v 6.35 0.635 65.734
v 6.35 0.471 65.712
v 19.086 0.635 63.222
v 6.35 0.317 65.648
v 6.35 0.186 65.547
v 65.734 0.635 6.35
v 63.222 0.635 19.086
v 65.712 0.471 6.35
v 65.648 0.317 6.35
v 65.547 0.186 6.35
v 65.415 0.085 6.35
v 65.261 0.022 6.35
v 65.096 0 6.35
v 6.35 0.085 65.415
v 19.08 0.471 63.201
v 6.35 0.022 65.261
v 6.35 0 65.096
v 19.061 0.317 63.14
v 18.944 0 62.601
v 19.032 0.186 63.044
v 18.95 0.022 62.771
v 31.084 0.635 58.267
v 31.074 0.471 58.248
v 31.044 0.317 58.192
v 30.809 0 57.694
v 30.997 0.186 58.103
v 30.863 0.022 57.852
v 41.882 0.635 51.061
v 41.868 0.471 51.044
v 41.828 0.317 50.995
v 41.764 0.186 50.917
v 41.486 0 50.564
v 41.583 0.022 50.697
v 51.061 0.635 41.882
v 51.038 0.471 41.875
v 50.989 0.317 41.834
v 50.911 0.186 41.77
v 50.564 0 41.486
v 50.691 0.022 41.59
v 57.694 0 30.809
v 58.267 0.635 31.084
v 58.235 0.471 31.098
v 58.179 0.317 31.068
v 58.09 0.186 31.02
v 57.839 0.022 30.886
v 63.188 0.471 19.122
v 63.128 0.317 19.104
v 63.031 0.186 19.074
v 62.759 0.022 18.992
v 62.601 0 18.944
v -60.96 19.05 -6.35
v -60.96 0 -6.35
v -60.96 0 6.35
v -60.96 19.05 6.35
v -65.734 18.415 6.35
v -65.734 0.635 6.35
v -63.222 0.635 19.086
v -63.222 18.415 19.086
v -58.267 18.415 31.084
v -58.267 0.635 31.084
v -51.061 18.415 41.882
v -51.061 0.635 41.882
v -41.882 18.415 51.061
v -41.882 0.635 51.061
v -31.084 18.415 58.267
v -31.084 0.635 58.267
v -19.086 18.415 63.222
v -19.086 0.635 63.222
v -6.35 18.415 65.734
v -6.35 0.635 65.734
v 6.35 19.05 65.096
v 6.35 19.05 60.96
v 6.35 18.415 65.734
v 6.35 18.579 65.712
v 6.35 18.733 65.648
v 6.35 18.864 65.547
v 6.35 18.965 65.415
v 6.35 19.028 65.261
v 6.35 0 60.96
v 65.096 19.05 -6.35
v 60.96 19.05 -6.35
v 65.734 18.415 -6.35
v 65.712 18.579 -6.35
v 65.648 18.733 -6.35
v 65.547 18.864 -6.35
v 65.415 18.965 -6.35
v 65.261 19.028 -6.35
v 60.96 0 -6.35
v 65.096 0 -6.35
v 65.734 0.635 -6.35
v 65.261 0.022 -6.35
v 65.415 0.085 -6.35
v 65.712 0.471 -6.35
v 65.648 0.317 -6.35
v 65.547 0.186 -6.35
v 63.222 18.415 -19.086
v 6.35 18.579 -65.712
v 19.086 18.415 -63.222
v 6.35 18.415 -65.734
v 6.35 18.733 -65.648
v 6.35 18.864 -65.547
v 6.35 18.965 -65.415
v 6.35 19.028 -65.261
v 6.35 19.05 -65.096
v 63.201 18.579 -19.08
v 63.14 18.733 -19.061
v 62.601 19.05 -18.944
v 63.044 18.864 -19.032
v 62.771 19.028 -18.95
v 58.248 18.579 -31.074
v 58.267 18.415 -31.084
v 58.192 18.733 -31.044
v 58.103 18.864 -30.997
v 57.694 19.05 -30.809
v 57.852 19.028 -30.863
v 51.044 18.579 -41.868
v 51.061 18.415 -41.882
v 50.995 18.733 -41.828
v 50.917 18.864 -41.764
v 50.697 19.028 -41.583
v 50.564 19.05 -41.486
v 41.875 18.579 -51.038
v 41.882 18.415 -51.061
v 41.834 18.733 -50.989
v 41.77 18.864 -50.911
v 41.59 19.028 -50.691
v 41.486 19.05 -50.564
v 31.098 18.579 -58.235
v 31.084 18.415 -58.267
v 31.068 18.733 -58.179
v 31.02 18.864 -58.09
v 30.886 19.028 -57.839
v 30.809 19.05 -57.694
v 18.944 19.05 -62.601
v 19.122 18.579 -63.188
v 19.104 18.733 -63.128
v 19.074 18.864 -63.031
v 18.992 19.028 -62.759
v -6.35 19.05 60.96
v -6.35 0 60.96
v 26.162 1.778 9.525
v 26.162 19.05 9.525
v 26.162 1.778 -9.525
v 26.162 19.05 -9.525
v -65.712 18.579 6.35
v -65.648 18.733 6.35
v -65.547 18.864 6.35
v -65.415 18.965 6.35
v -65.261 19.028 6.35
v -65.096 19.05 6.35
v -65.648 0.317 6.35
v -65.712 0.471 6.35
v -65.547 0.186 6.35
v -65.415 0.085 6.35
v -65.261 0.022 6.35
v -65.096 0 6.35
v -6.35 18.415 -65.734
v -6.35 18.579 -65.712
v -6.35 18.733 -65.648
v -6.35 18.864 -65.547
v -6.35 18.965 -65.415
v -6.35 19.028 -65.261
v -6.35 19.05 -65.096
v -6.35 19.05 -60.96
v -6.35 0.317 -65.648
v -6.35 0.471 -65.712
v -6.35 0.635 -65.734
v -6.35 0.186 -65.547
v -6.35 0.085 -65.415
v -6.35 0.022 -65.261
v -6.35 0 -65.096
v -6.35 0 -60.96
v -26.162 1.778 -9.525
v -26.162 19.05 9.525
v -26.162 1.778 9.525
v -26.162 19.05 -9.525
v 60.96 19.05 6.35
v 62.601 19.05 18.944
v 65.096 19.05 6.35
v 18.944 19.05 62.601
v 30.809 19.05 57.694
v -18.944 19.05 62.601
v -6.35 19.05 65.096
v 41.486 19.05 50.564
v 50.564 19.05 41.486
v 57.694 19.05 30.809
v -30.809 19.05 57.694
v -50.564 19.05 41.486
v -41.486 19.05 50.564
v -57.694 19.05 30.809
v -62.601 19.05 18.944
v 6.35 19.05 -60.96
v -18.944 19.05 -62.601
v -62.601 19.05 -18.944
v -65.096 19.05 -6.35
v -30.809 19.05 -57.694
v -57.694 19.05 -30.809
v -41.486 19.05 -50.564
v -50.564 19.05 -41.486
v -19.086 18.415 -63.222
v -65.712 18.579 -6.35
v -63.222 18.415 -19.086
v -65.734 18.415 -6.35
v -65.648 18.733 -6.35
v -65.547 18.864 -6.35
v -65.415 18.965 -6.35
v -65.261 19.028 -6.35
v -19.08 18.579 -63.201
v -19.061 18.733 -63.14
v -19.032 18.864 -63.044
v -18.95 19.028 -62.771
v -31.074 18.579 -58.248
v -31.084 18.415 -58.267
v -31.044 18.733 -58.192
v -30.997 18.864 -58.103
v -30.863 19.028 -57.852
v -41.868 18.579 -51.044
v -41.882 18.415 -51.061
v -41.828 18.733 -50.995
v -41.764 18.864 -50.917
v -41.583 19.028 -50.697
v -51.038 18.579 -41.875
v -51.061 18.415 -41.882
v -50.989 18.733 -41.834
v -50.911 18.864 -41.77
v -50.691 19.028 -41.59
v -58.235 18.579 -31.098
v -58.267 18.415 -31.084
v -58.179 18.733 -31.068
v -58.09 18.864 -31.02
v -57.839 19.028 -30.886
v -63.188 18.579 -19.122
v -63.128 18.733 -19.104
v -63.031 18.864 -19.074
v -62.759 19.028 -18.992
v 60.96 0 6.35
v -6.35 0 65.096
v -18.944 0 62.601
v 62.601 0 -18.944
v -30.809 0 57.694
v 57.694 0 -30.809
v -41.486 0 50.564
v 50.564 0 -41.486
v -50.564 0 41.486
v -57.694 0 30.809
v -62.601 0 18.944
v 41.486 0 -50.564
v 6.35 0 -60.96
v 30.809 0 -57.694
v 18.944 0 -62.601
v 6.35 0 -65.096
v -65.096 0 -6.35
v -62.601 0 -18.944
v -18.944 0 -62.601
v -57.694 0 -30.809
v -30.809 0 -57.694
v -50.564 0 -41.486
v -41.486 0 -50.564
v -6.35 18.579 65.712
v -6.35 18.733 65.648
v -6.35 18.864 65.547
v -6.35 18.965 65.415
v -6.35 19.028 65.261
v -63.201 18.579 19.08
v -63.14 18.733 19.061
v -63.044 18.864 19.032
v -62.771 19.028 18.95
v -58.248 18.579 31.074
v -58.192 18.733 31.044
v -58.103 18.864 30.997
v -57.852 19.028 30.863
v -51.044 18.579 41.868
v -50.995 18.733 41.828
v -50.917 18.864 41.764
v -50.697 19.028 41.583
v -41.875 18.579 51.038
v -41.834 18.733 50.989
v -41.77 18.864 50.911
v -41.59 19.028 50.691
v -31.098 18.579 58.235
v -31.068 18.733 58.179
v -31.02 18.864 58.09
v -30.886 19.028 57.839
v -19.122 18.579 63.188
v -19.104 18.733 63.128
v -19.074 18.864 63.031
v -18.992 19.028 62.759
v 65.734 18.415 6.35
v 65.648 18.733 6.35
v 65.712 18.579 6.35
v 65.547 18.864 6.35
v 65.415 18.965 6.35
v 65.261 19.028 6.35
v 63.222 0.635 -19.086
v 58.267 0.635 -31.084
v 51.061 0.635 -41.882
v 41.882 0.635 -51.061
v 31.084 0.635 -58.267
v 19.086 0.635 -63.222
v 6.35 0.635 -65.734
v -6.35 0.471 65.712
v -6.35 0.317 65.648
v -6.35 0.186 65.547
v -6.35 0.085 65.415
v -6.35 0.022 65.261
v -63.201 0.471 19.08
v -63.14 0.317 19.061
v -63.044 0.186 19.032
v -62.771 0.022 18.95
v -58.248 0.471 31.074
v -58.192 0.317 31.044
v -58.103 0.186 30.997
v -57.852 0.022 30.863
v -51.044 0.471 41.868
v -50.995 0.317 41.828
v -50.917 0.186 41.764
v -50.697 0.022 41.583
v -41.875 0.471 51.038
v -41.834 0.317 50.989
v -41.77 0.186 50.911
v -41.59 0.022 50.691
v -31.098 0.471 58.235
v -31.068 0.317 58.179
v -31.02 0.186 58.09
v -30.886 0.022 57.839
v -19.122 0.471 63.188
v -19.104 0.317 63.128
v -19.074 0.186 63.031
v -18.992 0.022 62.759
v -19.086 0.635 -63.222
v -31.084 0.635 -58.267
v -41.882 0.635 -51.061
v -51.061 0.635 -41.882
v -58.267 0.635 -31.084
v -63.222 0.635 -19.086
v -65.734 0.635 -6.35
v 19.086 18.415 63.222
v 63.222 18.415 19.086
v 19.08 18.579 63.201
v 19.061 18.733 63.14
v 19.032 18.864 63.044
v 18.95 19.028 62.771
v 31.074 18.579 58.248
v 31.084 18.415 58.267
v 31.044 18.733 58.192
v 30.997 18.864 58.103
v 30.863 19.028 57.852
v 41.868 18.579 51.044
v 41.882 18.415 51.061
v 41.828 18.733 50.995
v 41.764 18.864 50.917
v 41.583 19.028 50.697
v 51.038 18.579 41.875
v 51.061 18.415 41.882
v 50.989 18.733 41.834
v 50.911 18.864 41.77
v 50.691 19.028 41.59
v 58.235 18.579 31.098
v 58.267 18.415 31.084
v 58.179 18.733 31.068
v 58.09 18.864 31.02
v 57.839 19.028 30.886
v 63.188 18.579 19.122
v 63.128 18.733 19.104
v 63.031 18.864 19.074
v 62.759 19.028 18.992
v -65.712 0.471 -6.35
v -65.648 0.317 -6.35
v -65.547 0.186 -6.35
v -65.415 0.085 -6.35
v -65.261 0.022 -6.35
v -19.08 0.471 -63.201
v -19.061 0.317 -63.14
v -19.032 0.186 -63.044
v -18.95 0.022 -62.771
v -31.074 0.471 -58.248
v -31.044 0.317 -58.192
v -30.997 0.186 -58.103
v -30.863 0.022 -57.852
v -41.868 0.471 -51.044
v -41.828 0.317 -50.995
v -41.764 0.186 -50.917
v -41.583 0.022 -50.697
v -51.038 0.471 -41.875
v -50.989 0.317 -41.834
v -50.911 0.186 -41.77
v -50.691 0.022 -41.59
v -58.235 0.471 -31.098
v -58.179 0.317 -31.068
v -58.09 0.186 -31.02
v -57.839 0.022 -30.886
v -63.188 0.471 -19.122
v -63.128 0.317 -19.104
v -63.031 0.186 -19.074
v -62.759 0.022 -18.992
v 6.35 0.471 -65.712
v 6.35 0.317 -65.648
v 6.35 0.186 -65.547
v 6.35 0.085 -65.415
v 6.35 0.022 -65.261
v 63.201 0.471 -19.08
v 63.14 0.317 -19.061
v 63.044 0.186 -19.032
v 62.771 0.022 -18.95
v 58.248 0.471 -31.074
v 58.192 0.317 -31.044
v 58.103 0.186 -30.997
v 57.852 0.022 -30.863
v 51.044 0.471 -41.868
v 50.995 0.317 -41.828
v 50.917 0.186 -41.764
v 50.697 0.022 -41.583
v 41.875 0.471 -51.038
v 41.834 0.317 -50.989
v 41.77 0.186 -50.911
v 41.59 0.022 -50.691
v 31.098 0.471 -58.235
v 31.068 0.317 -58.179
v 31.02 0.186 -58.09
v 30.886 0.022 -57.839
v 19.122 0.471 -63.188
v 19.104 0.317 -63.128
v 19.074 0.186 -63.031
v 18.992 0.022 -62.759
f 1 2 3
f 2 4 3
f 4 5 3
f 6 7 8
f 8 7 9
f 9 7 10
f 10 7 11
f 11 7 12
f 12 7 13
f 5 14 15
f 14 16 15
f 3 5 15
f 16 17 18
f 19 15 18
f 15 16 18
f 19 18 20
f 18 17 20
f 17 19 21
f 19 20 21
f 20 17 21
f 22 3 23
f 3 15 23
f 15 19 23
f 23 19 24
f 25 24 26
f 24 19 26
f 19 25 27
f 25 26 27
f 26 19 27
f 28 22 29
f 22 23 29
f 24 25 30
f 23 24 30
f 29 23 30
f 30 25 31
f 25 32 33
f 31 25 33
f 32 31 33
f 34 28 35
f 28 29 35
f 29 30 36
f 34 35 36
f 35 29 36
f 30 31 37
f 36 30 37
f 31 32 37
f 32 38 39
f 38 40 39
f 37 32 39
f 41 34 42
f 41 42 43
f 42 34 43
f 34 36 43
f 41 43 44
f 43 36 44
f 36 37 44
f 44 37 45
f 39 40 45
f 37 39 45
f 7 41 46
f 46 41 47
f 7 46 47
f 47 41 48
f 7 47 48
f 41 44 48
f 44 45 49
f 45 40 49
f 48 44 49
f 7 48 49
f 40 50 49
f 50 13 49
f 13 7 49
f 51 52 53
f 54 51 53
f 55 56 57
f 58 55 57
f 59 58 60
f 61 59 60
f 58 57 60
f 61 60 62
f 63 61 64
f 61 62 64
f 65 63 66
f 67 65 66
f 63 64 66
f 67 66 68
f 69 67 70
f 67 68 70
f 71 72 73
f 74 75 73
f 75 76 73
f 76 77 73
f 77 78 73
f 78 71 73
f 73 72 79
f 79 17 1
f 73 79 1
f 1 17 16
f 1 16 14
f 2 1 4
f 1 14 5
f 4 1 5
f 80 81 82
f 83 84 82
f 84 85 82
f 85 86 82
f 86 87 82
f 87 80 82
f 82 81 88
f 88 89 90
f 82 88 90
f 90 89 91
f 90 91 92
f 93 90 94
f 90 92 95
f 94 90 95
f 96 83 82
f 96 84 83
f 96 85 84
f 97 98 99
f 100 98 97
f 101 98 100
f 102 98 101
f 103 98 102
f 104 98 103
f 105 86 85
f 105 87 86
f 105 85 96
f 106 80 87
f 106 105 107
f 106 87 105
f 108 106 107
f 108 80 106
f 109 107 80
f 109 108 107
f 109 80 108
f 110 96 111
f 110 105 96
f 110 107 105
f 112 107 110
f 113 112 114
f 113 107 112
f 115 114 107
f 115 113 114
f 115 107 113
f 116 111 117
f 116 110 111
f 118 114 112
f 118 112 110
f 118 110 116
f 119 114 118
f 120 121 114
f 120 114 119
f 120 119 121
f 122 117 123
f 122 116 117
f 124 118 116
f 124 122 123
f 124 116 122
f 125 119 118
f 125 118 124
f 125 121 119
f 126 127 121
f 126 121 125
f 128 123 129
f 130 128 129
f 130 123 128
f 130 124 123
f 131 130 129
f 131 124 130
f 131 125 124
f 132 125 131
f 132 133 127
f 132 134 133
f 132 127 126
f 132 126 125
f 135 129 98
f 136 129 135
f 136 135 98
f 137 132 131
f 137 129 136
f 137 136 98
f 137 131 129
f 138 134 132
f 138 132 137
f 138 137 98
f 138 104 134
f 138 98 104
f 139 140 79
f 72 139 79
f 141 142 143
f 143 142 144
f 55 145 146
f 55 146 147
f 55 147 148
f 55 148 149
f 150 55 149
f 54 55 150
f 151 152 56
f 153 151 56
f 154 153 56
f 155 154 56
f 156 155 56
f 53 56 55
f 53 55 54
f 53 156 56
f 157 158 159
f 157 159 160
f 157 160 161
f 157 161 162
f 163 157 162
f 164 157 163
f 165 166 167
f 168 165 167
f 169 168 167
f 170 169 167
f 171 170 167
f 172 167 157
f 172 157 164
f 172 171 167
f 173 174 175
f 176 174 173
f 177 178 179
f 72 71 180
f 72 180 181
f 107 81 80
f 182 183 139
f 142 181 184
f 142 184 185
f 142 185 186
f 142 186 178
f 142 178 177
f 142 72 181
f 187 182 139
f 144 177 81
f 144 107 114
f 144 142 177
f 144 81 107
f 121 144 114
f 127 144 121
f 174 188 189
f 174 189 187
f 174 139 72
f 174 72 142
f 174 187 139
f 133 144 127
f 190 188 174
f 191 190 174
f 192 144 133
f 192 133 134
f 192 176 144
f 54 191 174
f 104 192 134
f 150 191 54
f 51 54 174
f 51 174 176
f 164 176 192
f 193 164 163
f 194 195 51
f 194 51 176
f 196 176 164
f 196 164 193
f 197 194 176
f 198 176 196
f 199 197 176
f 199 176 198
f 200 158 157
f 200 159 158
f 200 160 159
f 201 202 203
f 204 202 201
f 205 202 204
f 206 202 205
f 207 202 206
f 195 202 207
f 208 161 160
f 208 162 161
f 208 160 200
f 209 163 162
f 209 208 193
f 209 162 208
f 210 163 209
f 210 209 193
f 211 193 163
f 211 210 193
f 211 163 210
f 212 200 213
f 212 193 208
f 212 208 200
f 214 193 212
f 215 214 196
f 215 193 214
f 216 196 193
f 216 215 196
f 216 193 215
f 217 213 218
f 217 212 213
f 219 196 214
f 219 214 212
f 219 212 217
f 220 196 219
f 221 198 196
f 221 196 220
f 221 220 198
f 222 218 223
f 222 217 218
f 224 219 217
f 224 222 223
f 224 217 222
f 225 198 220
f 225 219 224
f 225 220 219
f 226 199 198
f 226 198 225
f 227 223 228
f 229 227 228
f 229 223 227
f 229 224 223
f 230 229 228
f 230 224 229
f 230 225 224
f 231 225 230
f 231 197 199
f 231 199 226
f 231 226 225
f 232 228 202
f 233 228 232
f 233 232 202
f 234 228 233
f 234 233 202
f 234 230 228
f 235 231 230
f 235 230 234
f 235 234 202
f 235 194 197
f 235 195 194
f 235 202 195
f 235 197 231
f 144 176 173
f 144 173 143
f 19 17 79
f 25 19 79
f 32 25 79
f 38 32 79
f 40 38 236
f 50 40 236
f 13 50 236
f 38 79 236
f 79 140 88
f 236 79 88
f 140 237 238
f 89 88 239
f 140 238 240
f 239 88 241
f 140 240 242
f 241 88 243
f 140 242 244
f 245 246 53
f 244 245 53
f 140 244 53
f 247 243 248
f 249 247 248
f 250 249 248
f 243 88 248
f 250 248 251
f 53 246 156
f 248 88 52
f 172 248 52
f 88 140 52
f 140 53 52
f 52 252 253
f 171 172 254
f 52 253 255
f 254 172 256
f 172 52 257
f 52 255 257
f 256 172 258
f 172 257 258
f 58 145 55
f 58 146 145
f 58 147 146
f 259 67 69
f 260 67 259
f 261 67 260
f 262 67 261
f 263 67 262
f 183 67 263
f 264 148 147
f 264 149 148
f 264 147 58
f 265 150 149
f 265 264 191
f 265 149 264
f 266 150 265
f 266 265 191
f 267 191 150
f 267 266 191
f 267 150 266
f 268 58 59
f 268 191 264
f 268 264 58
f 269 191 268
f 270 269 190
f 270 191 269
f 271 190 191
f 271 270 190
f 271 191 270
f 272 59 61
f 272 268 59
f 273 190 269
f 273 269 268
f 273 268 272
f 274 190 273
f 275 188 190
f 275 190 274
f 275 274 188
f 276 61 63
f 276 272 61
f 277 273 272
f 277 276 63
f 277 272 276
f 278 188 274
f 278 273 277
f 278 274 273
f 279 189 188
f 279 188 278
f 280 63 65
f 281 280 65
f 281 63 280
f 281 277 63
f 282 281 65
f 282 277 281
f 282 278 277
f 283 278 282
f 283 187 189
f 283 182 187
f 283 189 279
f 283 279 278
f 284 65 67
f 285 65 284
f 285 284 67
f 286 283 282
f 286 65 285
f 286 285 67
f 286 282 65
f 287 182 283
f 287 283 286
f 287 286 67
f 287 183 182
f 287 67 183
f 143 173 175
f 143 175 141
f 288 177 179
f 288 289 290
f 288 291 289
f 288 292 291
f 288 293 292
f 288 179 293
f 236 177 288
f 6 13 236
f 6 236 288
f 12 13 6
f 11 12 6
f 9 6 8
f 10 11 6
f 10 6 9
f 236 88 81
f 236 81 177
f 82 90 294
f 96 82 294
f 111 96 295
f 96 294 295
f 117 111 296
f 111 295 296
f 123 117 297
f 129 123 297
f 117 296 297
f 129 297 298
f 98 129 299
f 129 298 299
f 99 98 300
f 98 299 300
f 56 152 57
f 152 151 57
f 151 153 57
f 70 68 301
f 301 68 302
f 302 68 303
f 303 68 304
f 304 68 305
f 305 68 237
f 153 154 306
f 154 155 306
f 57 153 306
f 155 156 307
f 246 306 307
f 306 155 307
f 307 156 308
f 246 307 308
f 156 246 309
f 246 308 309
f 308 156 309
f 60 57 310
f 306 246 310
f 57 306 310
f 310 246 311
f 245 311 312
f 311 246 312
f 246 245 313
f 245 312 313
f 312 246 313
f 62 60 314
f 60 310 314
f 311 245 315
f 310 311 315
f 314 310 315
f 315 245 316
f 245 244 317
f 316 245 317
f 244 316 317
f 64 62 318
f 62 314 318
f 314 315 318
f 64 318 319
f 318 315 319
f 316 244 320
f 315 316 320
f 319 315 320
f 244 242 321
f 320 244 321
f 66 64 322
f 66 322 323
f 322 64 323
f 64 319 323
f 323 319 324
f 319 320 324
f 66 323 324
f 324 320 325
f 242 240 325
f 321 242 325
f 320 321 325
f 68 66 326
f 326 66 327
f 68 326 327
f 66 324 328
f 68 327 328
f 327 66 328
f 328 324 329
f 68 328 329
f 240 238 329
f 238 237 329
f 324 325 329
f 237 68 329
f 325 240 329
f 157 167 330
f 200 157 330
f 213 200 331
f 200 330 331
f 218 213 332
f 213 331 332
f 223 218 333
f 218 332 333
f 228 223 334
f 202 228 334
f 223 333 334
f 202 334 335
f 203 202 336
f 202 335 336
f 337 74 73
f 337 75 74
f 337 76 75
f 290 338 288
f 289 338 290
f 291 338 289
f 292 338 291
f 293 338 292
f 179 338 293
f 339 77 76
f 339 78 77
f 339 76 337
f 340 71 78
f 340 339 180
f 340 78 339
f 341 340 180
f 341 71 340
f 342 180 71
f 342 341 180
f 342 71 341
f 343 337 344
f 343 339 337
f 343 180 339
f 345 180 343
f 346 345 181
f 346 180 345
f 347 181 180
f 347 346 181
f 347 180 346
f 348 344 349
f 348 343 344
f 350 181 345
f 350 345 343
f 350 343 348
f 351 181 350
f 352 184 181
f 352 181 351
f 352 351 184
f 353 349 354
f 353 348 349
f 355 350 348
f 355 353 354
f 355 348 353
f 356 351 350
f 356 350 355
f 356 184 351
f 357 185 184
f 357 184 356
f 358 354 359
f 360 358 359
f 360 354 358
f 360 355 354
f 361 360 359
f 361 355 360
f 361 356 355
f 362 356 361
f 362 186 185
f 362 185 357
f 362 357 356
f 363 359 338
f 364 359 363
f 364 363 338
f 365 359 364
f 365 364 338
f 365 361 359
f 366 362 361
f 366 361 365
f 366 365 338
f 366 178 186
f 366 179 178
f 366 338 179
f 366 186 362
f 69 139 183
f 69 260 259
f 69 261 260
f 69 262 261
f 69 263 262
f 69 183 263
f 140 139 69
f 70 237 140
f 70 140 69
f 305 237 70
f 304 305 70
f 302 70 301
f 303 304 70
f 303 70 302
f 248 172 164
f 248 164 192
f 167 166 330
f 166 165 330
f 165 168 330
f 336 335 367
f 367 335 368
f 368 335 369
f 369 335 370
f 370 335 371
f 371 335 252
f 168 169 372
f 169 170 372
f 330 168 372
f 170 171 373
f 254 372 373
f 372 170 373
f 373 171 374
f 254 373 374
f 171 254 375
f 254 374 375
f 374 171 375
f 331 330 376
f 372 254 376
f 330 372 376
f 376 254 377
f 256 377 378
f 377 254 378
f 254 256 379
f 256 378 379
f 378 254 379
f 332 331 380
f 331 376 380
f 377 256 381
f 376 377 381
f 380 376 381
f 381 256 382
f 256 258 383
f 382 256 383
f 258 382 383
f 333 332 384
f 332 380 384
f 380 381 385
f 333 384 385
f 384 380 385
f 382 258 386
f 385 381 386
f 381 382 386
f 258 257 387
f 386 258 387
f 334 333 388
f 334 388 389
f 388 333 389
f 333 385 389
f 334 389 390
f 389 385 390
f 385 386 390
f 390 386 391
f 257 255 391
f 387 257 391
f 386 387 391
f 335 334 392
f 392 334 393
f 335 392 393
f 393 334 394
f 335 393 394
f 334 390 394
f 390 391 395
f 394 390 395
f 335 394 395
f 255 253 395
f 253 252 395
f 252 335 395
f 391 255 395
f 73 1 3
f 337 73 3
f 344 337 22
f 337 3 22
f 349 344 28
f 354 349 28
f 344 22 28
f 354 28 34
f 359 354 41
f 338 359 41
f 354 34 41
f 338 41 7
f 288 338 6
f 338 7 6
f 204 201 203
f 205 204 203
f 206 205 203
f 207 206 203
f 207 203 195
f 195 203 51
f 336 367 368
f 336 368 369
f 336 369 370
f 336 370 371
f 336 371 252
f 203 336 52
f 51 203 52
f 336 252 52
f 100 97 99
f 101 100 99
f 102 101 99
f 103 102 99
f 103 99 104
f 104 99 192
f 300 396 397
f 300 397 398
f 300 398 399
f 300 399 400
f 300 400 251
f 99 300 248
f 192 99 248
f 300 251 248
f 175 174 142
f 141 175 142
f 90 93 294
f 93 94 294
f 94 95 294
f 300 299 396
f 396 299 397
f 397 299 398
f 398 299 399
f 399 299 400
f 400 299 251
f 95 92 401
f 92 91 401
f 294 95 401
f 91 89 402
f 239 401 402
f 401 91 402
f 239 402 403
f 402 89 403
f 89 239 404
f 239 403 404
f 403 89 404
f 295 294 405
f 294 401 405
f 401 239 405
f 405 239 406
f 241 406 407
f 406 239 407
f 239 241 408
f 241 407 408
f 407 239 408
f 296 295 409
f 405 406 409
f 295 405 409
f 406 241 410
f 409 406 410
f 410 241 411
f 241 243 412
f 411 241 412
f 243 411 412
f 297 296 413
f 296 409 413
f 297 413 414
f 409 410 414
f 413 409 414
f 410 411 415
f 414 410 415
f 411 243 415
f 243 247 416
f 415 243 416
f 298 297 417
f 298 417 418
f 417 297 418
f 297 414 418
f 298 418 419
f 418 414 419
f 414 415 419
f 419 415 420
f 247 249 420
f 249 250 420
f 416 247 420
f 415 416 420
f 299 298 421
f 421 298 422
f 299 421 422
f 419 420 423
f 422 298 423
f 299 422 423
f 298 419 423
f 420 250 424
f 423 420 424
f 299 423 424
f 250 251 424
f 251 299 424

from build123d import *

# Parameters (mm, degrees)
SKETCH2_R           = 66.04
BOSS_EXTRUDE1_DEPTH = 19.05
FILLET1_R           = 0.635
SKETCH4_W           = 12.7
SKETCH4_H           = 9.0994385
SKETCH4_W_2         = 9.0994385
SKETCH4_H_2         = 12.7
CUT_EXTRUDE2_DEPTH  = 96.317709267
SKETCH5_W           = 52.324
SKETCH5_H           = 19.05
CUT_EXTRUDE3_DEPTH  = 17.272


with BuildPart() as part:
    # Sketch2 → Boss-Extrude1 (new body)
    with BuildSketch(Plane(origin=(0, 0, 0), x_dir=(1, 0, 0), z_dir=(0, 1, 0))):
        with Locations(Location((0, 0, 0), (0, 0, 90))):
            Circle(SKETCH2_R)
    extrude(amount=BOSS_EXTRUDE1_DEPTH)

    # Fillet1
    fillet1_edges = [part.edges().sort_by_distance(p)[0] for p in [
        (0, 0, 66.04),
        (0, 19.05, 66.04),
    ]]
    fillet(fillet1_edges, radius=FILLET1_R)

    # Sketch4 → Cut-Extrude2 (cut, through all)
    with BuildSketch(Plane.XZ):
        with Locations((0, -65.50971925)):
            Rectangle(SKETCH4_W, SKETCH4_H)
        with Locations((-65.50971925, 0)):
            Rectangle(SKETCH4_W_2, SKETCH4_H_2)
        with Locations((0, 65.50971925)):
            Rectangle(SKETCH4_W, SKETCH4_H)
        with Locations((65.50971925, 0)):
            Rectangle(SKETCH4_W_2, SKETCH4_H_2)
    extrude(amount=-CUT_EXTRUDE2_DEPTH, mode=Mode.SUBTRACT)

    # Sketch5 → Cut-Extrude3 (cut)
    with BuildSketch(Plane(origin=(0, 19.05, 0), x_dir=(1, 0, 0), z_dir=(0, 1, 0))):
        Rectangle(SKETCH5_W, SKETCH5_H)
    extrude(amount=-CUT_EXTRUDE3_DEPTH, mode=Mode.SUBTRACT)


solid = part.part
